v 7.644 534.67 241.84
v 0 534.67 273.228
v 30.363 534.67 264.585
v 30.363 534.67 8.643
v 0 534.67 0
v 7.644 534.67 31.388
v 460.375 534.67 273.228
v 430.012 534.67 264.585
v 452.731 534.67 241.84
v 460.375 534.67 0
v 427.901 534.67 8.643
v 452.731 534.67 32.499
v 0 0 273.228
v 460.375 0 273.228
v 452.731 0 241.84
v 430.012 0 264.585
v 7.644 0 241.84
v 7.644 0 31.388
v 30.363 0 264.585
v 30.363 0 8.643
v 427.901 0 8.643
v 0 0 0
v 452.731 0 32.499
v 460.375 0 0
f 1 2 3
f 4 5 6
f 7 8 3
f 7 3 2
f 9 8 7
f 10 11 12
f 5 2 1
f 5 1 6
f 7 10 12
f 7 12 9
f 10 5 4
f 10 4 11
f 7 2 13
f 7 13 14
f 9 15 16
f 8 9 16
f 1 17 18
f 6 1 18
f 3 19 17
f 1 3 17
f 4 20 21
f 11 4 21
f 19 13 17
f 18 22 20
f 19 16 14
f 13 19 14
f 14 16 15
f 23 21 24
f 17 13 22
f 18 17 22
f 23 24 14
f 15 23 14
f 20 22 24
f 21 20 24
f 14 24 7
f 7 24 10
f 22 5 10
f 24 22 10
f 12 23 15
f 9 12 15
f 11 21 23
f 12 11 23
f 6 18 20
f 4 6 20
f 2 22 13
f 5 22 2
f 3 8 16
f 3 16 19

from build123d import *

# Parameters (mm, degrees)
F0_W     = 460.375
F0_H     = 534.67
F1_DEPTH = 273.2278
F3_DEPTH = 536.956


# Not quite as in the source:
# - a feature names something its author has since deleted; it is built from what else it names


with BuildPart() as f1:
    # F0 (on Top) → F1 (new body)
    with BuildSketch(Plane.XY):
        with Locations((230.1875, 267.335)):
            Rectangle(F0_W, F0_H)
    extrude(amount=F1_DEPTH)

    # F2 (on face) → F3 (cut)
    with BuildSketch(Plane.XZ):
        Polygon((452.7307115978, 241.8399496412), (430.0117425975, 264.584589793), (30.3632574025, 264.584589793), (7.6442884022, 241.8399496412), (7.6442884022, 31.3878503588), (30.3632574025, 8.643210207), (427.9011, 8.643210207), (452.7307115978, 32.4993), align=None)
    extrude(amount=-F3_DEPTH, mode=Mode.SUBTRACT)


solid = f1.part
